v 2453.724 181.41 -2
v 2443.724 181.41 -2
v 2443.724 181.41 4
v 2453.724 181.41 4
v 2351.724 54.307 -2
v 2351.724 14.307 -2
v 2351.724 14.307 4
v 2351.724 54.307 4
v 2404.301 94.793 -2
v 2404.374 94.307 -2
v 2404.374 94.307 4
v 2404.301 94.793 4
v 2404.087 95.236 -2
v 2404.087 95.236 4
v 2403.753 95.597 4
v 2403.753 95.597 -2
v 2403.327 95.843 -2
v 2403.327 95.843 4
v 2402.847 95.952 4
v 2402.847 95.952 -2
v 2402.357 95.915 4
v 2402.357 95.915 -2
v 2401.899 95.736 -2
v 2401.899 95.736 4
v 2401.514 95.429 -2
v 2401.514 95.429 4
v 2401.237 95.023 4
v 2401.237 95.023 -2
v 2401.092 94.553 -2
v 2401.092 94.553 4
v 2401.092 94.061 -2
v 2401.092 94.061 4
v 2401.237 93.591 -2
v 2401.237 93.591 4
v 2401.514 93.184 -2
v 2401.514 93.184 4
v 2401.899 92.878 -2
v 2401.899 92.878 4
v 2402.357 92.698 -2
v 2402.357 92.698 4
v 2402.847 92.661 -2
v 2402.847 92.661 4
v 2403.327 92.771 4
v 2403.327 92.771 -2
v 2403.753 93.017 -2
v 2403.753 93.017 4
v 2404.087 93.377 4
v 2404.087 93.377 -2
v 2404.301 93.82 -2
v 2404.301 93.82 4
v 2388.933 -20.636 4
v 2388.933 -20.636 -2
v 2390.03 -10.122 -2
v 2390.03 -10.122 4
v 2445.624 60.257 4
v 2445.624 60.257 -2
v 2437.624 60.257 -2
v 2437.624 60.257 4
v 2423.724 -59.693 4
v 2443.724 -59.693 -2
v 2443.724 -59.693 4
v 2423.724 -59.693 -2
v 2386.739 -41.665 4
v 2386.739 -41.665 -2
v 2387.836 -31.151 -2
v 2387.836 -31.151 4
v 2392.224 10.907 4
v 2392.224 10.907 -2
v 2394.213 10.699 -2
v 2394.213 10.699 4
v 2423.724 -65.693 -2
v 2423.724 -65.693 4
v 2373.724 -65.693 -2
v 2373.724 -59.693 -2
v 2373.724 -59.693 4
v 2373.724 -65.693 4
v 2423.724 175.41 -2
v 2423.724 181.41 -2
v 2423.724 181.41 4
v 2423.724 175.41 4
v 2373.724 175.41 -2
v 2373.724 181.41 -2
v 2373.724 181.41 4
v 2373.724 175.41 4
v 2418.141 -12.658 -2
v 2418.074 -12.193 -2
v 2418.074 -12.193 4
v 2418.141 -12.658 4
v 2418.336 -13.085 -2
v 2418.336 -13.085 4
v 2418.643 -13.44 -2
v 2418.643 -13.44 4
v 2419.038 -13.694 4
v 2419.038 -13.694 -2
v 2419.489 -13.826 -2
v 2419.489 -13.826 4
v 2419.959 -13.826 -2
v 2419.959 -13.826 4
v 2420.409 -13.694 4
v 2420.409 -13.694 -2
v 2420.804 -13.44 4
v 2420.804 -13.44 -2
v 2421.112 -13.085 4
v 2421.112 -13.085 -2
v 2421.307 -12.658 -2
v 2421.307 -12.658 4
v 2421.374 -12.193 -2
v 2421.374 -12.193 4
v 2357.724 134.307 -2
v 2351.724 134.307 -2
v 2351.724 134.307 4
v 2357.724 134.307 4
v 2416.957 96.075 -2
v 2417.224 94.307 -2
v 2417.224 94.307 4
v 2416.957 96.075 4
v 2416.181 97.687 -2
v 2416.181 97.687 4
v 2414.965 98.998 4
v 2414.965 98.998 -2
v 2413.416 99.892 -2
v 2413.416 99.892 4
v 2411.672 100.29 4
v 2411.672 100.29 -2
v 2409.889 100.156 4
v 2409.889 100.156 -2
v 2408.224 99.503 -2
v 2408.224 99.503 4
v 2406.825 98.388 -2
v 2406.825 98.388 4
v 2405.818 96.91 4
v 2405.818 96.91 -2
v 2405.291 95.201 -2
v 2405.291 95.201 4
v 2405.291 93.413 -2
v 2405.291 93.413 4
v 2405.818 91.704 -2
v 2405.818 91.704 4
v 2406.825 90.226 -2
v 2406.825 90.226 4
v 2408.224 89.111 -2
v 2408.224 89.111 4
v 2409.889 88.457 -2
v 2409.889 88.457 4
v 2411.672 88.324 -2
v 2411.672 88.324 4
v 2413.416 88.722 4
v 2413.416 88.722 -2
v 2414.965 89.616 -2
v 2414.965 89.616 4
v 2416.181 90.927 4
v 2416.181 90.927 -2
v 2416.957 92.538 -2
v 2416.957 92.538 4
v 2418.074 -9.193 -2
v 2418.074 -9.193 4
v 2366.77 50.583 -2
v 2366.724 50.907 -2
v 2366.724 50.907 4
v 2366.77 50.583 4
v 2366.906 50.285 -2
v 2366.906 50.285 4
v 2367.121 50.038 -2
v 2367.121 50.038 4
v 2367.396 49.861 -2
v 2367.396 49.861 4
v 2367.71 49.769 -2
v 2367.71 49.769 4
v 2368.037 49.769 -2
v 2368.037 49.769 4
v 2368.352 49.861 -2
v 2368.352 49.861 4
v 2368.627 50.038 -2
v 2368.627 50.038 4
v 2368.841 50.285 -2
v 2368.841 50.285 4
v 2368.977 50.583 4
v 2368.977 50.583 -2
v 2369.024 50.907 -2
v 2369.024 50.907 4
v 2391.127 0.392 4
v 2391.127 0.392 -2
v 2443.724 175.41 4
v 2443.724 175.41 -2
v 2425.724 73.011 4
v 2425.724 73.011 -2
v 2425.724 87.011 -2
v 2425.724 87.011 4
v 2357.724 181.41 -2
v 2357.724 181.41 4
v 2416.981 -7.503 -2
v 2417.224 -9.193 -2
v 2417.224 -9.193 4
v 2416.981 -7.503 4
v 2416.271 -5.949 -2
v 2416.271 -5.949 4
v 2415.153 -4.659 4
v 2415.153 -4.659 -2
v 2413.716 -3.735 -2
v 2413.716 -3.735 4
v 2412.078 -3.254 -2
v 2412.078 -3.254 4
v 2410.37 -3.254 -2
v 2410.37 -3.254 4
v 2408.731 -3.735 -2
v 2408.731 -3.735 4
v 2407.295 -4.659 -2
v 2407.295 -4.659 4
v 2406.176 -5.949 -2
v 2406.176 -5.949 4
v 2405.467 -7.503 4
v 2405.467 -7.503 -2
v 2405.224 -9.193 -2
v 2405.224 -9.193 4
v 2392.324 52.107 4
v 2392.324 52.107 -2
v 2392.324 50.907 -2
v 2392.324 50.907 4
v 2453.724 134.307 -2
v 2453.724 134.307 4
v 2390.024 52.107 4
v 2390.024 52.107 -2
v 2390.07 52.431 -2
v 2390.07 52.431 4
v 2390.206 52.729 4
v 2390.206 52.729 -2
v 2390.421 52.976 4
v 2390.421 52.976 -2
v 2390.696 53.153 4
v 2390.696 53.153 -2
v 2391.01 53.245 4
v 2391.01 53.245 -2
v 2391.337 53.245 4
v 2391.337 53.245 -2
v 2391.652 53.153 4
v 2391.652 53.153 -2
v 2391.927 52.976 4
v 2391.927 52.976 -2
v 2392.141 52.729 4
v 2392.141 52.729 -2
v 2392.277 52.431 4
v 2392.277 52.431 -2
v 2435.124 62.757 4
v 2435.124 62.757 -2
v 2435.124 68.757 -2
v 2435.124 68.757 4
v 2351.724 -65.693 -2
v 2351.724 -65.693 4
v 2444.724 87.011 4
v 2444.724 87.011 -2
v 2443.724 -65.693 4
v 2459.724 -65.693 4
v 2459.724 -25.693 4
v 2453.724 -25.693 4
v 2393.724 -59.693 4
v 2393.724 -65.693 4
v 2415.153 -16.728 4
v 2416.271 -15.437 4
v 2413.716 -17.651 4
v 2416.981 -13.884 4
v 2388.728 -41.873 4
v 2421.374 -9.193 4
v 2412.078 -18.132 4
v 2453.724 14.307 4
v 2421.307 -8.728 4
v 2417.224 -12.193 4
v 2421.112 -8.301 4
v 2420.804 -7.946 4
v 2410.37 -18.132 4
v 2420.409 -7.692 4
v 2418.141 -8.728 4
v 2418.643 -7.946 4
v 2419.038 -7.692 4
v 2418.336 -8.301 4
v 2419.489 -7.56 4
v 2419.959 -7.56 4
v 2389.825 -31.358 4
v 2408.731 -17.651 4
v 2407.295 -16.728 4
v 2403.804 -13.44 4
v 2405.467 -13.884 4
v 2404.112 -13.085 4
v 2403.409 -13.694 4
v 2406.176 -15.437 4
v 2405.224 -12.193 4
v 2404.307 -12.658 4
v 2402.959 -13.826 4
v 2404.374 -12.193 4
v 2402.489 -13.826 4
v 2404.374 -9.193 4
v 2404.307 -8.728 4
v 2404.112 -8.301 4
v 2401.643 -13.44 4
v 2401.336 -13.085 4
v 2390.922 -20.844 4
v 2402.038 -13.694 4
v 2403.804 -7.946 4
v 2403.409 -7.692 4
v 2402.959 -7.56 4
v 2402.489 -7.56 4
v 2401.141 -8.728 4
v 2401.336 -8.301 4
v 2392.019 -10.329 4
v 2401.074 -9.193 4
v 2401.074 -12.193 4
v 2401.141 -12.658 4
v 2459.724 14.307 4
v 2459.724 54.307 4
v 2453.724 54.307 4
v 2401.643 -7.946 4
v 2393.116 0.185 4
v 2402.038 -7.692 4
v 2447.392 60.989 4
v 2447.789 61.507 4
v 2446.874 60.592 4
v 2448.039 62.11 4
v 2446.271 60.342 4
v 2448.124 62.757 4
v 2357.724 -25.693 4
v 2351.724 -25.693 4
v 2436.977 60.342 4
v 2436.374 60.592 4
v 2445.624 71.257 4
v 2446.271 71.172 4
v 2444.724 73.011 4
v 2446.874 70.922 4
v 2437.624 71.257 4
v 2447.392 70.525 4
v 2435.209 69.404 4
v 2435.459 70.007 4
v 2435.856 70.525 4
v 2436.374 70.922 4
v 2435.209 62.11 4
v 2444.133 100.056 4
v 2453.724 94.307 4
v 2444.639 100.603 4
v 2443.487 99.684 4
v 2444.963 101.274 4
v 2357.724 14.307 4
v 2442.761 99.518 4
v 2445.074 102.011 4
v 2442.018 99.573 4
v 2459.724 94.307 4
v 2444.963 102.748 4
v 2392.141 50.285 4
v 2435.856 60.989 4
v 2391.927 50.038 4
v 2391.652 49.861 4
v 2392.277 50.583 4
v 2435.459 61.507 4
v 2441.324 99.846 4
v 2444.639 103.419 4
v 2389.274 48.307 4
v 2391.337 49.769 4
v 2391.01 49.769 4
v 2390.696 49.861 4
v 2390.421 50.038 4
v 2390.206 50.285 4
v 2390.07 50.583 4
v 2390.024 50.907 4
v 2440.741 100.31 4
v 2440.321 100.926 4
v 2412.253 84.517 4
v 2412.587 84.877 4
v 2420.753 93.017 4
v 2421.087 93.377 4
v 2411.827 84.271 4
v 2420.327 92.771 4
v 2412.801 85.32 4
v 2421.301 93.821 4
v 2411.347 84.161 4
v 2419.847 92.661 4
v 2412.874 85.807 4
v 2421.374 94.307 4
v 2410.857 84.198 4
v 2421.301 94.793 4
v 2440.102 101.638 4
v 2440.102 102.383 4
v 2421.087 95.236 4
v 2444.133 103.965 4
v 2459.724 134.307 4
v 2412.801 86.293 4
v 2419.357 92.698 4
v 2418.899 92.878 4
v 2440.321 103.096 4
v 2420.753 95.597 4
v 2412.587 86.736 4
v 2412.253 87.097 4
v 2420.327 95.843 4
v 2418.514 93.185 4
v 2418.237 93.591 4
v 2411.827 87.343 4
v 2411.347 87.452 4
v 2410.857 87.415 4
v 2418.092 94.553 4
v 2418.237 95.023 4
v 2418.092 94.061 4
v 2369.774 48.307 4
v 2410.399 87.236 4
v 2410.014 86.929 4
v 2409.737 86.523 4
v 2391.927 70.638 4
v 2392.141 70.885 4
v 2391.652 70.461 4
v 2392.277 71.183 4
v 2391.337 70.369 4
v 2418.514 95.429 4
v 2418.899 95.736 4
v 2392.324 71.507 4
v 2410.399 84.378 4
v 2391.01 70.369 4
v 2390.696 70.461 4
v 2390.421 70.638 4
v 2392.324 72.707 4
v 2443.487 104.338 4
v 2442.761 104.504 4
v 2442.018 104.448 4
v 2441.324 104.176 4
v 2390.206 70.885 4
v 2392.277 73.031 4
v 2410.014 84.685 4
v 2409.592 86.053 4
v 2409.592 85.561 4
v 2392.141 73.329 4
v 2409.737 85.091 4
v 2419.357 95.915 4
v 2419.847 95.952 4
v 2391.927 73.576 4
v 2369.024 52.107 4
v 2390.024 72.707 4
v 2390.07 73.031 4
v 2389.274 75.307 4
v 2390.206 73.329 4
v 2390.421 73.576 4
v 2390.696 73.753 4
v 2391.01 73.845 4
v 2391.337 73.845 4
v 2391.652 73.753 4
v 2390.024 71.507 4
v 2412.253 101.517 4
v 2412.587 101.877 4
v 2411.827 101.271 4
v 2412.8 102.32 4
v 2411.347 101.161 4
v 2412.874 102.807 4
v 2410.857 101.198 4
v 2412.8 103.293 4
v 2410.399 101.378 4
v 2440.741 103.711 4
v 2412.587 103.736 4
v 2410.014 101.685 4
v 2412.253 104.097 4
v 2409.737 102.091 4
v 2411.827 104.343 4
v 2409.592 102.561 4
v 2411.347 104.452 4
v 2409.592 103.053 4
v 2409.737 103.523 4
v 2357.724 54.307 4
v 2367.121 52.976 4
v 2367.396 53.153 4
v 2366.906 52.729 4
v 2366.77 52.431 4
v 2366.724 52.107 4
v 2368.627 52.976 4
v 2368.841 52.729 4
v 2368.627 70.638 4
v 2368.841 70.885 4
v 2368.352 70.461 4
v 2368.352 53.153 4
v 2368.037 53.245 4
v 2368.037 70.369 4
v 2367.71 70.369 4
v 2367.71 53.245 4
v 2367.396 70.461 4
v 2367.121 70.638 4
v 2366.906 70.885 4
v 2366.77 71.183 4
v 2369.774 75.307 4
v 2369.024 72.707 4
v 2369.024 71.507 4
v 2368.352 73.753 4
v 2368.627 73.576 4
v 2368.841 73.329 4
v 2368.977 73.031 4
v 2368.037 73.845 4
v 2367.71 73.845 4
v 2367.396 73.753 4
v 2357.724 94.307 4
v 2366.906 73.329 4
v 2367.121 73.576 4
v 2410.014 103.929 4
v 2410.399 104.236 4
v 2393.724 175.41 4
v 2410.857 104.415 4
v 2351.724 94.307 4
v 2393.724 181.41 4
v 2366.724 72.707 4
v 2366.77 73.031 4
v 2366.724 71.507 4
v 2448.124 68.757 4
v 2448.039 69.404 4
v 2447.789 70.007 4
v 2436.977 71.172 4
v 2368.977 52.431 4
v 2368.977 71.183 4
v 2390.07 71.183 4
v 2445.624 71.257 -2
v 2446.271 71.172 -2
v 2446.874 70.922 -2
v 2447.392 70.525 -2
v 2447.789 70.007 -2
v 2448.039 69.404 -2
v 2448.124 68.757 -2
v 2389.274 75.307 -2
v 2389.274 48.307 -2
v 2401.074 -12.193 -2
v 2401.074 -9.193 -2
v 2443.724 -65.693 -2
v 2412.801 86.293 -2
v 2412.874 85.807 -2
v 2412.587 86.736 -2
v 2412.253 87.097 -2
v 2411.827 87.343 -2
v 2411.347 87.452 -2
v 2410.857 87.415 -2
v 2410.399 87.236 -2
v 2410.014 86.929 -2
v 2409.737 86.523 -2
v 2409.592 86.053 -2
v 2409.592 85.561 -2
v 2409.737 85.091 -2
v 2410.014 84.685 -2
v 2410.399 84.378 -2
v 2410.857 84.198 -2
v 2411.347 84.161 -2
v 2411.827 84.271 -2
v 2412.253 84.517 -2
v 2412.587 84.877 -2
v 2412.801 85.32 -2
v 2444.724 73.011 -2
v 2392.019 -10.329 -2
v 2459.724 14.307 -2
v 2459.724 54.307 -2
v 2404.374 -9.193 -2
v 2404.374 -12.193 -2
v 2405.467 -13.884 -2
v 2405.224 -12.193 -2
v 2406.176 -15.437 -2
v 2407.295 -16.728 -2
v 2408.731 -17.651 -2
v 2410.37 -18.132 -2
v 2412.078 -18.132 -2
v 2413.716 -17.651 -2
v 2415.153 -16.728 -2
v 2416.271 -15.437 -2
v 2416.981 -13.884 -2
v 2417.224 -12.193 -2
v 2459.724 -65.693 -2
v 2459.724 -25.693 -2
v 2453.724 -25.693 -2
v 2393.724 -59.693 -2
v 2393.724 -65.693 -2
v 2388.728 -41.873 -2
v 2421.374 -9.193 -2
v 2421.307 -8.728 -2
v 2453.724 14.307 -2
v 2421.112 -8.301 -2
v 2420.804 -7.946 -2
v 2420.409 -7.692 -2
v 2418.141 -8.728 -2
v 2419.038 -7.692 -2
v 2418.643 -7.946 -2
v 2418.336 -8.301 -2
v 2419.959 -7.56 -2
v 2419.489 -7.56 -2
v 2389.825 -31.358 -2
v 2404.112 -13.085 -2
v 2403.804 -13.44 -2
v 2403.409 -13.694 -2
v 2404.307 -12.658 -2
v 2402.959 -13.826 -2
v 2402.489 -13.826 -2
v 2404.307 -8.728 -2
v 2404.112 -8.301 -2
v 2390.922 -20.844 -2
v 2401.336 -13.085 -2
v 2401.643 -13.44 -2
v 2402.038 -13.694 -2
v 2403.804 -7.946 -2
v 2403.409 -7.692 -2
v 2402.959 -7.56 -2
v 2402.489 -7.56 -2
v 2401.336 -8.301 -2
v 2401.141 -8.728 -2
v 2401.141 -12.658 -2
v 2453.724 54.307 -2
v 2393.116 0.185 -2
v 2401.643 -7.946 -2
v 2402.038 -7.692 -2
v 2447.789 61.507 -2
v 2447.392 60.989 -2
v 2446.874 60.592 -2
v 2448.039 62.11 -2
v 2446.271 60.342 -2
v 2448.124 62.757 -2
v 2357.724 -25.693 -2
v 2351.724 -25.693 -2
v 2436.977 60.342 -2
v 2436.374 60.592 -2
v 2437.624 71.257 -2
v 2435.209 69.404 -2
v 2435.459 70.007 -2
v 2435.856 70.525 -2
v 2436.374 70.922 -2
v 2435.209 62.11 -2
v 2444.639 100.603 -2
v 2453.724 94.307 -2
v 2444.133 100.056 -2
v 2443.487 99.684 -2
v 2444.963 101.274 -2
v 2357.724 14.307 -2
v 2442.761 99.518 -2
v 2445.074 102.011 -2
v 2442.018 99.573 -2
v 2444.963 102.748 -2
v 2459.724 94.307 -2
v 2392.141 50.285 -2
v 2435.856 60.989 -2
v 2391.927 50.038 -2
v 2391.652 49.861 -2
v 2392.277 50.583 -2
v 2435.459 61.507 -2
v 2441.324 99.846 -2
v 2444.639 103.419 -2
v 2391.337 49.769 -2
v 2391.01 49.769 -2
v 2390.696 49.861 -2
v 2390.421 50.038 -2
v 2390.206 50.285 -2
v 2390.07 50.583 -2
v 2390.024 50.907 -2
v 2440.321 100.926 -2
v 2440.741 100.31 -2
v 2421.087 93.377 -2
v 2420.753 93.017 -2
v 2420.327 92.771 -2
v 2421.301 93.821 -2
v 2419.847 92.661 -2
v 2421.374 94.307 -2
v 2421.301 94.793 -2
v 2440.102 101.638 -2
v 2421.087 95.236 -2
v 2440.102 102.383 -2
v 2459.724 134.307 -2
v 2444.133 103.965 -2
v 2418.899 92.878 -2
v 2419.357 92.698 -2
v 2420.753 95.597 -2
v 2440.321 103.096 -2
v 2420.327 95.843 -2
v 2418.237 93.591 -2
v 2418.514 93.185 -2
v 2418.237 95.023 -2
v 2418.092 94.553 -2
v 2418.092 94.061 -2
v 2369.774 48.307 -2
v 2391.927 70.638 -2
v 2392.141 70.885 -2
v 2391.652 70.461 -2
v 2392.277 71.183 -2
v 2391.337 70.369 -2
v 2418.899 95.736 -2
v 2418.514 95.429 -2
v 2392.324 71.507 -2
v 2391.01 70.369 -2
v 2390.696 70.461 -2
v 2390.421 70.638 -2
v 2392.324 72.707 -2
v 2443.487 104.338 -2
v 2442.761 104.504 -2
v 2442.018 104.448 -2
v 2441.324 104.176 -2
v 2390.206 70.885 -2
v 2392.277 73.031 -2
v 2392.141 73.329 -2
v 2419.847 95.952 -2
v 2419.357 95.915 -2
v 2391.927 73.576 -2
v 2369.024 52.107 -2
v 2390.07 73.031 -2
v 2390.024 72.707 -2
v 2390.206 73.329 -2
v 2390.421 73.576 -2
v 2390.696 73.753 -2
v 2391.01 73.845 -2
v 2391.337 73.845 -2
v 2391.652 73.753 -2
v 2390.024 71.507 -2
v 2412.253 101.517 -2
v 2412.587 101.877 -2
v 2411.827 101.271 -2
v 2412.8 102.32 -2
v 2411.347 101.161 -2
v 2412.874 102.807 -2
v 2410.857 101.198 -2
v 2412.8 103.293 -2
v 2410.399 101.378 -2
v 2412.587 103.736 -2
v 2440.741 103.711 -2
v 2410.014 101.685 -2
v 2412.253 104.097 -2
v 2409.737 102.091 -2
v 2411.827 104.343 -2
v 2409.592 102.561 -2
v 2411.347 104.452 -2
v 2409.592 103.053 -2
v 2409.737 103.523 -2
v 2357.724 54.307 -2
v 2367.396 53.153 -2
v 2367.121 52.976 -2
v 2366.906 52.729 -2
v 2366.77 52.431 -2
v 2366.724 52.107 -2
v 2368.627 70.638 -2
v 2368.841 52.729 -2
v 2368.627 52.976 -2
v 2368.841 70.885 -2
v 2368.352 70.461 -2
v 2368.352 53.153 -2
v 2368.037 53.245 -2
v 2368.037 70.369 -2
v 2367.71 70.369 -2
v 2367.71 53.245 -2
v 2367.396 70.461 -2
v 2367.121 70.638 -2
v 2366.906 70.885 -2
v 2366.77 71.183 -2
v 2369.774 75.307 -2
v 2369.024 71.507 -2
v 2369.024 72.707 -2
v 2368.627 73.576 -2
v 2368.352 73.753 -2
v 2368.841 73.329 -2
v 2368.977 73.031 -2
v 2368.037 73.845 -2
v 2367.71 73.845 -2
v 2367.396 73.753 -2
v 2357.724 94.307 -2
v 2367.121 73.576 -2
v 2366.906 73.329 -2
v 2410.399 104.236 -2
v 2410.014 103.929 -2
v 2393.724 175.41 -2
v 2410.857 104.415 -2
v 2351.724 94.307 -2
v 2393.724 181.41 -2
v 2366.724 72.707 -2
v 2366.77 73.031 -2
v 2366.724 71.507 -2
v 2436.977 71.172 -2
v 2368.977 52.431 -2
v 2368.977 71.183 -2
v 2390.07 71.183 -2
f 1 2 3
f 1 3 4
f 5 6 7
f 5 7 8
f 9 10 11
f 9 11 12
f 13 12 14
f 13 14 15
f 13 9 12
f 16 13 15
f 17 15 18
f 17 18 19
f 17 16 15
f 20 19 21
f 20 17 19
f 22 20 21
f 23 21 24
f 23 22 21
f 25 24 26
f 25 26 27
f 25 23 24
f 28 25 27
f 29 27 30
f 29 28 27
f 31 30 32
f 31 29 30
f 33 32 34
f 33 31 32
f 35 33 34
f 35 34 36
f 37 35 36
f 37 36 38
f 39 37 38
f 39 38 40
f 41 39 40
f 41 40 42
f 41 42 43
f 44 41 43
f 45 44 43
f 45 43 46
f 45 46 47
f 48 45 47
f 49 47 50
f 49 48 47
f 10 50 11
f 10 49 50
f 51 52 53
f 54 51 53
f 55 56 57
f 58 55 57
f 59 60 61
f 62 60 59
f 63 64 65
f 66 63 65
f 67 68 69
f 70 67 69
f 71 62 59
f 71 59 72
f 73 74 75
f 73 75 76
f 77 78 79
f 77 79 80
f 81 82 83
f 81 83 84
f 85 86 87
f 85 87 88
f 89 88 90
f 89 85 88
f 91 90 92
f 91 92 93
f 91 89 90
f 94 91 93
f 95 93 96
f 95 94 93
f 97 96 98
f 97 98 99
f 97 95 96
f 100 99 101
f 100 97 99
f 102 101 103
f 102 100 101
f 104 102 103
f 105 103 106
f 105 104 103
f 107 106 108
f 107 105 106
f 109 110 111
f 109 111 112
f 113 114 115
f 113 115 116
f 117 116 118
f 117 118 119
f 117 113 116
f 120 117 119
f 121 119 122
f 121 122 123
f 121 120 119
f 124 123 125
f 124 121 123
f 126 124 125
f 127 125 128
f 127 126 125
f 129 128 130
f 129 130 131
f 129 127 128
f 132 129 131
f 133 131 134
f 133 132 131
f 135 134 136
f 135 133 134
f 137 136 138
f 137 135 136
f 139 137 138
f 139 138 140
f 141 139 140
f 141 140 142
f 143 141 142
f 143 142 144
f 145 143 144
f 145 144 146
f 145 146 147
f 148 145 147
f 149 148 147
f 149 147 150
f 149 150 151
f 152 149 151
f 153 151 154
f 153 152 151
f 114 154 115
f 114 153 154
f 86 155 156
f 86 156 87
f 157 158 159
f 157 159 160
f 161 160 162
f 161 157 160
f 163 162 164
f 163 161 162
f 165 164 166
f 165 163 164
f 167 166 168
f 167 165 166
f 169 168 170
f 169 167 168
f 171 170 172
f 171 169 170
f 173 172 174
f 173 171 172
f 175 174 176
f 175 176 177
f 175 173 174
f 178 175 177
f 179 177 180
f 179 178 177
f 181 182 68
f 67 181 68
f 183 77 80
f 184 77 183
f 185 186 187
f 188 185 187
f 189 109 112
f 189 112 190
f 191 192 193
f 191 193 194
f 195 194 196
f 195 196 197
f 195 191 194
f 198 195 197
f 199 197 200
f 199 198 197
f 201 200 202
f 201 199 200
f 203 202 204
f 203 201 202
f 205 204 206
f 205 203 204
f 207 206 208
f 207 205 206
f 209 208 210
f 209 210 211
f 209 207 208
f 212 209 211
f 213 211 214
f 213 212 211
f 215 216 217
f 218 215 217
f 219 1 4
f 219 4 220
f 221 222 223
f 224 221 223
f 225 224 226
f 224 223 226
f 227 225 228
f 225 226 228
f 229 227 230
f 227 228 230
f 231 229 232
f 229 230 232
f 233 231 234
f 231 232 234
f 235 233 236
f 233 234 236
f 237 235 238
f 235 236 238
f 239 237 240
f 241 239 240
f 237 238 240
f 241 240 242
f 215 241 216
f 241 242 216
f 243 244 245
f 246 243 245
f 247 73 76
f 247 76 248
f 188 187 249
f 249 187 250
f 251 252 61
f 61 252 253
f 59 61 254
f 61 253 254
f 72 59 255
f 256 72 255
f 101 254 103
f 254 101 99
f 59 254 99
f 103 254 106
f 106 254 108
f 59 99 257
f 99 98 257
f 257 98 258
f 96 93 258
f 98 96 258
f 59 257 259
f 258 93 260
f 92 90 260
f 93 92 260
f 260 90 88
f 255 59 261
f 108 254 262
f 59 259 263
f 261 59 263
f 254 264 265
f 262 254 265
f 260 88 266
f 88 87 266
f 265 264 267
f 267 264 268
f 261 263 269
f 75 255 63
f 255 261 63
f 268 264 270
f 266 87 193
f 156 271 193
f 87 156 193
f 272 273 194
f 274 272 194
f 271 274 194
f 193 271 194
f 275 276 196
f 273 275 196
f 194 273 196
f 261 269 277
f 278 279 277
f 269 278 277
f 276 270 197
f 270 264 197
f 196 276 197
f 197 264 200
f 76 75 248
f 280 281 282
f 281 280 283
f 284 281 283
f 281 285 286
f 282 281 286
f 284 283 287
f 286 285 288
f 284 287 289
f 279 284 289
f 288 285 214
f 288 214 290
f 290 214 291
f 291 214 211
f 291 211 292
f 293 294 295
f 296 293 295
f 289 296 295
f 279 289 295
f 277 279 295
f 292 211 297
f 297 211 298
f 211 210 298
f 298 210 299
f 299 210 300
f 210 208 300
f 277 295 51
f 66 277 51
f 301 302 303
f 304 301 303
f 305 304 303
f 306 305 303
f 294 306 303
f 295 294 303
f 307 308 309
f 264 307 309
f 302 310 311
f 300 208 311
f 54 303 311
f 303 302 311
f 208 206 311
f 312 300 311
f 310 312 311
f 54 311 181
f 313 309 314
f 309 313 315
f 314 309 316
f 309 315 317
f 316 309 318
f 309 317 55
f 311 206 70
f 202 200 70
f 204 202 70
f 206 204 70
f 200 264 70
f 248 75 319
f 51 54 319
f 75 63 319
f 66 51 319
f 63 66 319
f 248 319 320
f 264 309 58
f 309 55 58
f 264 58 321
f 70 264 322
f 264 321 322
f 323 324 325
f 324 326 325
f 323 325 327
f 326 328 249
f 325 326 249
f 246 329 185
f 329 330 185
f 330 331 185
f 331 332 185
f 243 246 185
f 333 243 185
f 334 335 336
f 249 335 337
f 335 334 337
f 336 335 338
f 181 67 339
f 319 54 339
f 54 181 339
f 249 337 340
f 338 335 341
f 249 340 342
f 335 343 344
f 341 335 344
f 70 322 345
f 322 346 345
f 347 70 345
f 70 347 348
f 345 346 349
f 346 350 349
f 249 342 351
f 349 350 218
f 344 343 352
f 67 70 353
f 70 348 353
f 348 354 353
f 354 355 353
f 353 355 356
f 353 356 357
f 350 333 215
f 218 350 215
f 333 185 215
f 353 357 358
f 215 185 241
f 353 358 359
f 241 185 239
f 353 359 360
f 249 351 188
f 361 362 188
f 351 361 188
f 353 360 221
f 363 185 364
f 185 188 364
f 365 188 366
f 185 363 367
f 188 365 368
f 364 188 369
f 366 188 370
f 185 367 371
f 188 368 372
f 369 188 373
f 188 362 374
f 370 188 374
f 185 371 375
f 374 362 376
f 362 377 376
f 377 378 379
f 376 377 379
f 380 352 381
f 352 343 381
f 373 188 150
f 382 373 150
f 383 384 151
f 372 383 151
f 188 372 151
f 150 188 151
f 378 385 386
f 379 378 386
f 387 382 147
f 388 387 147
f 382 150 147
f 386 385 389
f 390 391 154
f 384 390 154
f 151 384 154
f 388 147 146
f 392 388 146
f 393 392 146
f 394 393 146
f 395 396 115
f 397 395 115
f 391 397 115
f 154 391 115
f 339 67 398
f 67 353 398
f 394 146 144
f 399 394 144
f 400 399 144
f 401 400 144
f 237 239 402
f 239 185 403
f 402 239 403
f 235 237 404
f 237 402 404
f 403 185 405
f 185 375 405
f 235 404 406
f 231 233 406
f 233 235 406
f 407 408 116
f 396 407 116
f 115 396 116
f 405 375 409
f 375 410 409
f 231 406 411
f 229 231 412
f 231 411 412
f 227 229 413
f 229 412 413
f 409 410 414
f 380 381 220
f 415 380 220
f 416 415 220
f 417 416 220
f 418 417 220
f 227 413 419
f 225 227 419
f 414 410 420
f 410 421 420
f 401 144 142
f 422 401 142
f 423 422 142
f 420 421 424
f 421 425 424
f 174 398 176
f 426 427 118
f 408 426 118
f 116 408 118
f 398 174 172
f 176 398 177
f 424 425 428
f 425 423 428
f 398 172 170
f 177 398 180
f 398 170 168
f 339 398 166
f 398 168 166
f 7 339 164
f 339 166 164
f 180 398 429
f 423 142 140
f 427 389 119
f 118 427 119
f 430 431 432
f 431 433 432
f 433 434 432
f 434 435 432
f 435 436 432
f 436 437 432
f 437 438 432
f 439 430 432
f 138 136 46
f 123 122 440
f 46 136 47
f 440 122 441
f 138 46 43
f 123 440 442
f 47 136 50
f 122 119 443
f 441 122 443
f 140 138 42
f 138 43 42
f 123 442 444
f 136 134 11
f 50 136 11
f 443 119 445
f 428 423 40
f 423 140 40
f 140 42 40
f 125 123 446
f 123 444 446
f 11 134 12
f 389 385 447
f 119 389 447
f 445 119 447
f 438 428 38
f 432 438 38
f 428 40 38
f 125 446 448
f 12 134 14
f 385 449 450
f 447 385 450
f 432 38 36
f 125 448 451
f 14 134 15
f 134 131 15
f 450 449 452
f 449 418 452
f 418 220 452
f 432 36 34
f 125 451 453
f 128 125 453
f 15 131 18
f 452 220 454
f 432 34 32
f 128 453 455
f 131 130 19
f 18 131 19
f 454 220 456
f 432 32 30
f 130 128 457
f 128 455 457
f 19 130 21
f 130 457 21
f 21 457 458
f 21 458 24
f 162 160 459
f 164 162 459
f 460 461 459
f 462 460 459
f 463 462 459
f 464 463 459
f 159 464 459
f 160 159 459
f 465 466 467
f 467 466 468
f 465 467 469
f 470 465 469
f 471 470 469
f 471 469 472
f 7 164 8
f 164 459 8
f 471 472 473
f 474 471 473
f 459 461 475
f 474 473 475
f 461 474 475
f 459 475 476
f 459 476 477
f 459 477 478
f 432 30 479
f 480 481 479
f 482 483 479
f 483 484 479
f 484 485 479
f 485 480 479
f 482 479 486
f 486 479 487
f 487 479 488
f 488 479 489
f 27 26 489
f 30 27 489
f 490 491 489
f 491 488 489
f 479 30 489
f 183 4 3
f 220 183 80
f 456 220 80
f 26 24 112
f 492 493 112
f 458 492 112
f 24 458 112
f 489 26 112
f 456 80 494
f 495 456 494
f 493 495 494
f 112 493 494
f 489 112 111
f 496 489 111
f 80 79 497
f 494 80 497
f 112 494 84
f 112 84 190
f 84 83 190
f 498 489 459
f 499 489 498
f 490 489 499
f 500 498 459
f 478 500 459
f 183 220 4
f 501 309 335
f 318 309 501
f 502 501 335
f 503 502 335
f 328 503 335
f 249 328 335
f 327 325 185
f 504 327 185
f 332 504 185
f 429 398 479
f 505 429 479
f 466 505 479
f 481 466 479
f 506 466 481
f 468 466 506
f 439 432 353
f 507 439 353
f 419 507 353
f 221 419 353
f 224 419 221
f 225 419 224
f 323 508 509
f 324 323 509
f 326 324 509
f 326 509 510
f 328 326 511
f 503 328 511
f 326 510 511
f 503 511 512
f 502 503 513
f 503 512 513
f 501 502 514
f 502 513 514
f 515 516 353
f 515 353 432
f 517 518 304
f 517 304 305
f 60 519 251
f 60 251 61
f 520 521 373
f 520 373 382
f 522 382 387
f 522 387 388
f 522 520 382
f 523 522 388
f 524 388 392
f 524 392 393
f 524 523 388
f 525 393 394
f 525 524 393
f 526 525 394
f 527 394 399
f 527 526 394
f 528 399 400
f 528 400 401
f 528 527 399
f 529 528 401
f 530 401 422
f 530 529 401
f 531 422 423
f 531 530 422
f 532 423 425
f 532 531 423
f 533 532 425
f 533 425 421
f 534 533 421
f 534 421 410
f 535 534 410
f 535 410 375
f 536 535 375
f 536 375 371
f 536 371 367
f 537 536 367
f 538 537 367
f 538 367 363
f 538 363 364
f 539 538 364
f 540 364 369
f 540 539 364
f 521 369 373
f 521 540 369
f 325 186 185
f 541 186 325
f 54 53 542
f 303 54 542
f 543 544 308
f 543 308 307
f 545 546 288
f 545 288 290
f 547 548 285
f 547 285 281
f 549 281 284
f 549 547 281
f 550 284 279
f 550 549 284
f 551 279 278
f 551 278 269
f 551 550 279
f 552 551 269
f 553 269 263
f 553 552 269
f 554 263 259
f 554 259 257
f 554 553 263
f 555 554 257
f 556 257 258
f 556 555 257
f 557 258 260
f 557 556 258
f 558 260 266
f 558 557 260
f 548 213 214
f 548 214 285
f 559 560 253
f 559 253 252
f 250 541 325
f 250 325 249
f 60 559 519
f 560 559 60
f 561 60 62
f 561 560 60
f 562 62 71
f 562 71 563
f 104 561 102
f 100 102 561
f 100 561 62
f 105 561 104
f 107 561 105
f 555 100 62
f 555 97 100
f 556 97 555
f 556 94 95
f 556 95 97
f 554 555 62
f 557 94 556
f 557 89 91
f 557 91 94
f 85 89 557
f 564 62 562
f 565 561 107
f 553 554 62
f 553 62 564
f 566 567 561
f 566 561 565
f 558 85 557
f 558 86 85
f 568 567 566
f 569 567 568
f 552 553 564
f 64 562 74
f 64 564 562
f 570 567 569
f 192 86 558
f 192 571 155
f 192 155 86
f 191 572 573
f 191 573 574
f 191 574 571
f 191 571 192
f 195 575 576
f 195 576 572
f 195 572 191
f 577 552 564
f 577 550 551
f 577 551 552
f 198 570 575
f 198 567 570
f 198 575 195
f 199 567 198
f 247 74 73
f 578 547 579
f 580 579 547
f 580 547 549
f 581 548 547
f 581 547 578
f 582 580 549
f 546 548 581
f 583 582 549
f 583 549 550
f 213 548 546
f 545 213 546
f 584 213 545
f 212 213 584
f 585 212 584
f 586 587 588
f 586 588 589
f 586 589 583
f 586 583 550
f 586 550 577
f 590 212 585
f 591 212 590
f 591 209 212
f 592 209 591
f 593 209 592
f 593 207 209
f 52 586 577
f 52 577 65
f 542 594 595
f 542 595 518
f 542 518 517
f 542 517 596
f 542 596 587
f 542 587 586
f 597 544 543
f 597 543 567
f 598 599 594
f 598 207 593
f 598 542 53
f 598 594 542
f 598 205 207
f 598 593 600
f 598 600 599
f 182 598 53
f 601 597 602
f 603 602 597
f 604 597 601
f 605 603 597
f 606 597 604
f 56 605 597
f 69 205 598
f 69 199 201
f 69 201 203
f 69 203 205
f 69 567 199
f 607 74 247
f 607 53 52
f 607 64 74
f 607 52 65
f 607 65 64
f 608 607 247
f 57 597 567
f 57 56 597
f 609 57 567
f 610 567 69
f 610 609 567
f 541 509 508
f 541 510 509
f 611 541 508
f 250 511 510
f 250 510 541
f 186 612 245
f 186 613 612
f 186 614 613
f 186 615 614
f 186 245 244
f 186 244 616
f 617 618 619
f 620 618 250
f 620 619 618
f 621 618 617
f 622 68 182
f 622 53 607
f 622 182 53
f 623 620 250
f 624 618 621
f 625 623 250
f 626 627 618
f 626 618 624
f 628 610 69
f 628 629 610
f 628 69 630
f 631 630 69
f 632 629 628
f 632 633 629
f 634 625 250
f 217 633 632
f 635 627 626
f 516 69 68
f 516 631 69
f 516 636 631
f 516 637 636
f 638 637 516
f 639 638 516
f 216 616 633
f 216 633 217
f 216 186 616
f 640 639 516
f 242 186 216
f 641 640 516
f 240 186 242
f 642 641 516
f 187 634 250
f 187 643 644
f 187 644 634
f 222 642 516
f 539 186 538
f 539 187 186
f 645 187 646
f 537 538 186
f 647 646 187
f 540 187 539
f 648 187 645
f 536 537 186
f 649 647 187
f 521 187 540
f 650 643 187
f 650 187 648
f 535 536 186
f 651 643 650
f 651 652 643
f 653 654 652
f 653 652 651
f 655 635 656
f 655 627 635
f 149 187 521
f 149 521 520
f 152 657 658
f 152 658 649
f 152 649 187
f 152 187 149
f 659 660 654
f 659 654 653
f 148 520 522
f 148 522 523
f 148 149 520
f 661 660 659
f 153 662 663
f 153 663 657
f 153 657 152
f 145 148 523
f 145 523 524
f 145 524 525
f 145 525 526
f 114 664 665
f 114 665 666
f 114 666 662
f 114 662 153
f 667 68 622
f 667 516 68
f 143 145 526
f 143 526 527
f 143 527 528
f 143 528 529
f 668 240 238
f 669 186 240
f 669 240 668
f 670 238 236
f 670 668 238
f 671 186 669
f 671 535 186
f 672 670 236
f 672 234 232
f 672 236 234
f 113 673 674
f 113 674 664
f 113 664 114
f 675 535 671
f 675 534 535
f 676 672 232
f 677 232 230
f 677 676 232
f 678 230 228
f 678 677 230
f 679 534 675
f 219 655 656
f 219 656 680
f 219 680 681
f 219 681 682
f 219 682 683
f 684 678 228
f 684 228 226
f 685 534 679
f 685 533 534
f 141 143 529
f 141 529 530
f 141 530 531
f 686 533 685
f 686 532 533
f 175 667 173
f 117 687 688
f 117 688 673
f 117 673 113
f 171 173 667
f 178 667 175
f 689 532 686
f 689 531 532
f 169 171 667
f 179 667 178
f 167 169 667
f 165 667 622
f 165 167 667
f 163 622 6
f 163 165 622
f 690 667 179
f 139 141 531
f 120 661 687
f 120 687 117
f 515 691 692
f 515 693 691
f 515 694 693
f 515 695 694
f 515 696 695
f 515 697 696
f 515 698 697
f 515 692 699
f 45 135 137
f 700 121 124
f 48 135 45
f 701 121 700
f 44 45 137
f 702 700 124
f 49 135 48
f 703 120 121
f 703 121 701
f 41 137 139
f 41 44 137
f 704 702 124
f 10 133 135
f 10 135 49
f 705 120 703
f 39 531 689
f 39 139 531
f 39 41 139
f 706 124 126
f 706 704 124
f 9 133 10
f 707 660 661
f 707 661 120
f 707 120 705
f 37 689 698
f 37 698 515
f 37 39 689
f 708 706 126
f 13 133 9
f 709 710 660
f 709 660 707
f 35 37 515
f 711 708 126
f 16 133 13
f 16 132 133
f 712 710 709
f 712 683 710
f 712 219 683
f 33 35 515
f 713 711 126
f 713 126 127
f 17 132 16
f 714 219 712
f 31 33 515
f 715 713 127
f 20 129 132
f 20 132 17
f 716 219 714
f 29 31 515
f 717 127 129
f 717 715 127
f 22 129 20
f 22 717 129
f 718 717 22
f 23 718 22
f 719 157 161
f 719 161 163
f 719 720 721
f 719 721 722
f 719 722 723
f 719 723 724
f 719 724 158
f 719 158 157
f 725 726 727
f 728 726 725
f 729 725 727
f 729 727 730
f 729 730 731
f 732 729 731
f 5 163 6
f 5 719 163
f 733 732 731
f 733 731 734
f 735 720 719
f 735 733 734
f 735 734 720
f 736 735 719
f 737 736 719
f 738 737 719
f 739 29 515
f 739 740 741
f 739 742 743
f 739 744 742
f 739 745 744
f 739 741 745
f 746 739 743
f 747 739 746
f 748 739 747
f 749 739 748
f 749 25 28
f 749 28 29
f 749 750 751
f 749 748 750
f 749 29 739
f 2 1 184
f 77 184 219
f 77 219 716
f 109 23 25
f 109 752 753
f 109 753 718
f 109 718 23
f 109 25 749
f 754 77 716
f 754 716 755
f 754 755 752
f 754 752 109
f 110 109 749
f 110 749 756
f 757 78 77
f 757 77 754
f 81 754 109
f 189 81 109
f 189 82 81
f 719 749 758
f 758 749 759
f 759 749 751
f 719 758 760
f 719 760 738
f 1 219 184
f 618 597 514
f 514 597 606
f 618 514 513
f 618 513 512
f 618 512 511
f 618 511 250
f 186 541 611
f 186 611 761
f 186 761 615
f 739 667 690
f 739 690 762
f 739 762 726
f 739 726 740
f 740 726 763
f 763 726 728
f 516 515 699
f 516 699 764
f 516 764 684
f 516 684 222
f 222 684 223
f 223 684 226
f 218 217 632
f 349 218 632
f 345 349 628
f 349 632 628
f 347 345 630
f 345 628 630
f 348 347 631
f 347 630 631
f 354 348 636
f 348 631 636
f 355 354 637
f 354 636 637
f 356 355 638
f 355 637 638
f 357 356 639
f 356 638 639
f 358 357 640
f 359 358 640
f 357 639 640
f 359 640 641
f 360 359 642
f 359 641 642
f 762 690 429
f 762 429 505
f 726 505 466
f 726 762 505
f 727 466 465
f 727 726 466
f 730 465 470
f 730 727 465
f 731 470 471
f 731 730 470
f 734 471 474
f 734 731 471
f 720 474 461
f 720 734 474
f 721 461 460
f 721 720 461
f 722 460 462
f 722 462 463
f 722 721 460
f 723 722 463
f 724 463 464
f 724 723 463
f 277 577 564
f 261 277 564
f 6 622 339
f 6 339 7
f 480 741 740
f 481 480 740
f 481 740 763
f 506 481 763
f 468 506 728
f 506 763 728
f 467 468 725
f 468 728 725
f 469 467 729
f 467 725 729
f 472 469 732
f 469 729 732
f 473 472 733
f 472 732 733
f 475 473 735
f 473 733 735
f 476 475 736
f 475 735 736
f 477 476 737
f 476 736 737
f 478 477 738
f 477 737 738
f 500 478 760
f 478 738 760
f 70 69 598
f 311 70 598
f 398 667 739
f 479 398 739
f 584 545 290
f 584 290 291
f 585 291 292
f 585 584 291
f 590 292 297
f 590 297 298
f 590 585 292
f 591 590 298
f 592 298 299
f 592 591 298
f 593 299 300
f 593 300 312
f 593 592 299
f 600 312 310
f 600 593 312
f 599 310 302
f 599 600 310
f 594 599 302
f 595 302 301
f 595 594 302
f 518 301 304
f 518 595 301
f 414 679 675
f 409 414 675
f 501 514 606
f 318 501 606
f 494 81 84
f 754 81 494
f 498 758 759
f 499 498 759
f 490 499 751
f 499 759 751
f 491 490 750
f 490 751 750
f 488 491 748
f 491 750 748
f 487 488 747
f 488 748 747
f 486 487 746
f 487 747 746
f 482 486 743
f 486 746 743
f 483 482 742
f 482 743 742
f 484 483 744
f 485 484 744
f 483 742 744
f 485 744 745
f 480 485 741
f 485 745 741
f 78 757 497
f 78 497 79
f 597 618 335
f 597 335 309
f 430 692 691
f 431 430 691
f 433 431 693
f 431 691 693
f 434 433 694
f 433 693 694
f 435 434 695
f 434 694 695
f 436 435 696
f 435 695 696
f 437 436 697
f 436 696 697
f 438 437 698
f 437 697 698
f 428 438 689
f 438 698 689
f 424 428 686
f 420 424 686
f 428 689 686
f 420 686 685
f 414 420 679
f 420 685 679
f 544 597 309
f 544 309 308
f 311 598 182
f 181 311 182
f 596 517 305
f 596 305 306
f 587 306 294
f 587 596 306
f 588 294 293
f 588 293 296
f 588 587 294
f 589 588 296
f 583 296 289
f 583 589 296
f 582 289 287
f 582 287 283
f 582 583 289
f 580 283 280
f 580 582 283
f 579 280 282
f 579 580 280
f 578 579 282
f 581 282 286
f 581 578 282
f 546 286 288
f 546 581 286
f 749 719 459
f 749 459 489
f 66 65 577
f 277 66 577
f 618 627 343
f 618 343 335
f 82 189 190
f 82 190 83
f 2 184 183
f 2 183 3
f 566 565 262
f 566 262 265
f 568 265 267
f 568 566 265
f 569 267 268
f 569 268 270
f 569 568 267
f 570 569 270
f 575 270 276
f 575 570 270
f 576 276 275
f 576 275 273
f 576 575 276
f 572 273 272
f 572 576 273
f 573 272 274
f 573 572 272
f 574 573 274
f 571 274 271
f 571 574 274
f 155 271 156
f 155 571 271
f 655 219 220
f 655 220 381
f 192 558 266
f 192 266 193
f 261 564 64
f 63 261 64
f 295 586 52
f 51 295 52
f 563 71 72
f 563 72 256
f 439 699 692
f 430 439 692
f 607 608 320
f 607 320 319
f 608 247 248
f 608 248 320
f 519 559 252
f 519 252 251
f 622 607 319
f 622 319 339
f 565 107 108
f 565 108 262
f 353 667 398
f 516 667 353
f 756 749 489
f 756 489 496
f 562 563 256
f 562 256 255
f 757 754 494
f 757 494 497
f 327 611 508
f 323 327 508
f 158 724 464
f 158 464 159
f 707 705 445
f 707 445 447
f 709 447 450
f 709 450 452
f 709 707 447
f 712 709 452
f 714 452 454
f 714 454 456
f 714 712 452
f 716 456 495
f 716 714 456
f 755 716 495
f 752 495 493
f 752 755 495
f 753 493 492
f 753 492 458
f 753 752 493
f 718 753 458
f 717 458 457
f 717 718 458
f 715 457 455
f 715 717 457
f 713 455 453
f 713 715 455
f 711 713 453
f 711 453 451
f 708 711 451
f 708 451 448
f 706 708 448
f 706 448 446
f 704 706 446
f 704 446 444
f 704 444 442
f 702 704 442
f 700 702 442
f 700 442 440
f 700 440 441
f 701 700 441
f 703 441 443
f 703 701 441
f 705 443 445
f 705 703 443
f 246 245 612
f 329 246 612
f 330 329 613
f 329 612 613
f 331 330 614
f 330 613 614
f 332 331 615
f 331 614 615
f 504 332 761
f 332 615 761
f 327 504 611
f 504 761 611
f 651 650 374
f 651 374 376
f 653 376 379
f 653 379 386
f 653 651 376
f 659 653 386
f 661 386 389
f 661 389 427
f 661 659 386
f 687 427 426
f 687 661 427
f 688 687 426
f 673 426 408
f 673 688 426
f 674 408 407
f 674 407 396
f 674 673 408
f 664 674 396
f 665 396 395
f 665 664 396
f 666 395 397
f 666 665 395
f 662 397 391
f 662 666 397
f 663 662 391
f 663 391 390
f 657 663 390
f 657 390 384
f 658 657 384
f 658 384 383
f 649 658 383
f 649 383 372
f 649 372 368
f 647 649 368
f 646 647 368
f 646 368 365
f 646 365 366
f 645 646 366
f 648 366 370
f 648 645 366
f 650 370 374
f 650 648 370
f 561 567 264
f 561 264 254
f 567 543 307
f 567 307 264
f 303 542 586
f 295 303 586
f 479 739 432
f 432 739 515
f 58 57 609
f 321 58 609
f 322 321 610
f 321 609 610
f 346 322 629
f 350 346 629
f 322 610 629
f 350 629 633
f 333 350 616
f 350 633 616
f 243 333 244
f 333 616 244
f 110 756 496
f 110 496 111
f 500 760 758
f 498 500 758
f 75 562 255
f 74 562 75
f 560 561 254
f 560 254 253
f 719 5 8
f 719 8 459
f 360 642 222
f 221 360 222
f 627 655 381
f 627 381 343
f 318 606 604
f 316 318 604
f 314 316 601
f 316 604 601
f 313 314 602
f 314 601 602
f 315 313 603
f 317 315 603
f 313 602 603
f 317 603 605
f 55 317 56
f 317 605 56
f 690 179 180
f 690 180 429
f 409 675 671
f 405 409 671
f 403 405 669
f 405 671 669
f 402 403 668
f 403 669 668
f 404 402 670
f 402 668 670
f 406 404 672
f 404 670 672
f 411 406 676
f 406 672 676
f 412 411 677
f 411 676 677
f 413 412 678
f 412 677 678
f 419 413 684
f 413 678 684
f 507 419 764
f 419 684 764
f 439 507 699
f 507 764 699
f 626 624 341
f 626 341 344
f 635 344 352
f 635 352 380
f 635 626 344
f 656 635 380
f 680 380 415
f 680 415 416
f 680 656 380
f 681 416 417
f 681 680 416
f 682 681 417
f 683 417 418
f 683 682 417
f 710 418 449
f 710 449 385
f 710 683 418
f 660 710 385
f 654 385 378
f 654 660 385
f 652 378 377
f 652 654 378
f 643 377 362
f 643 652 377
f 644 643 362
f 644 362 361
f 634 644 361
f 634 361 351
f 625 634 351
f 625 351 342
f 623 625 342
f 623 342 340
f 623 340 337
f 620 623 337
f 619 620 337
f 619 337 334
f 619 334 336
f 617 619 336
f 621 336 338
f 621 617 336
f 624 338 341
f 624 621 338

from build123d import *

# Parameters (mm, degrees)
ESQUISSE1_R        = 1.65
ESQUISSE1_R_2      = 6
ESQUISSE1_R_3      = 2.5
ESQUISSE1_W        = 19.5
ESQUISSE1_H        = 27
ESQUISSE1_W_2      = 19
ESQUISSE1_H_2      = 14
BOSS_EXTRU_1_DEPTH = 6


with BuildPart() as part:
    # Esquisse1 → Boss.-Extru.1 (new body)
    with BuildSketch(Plane.XY.offset(-2)):
        Polygon((2459.723805414, -65.693190997), (2443.723805414, -65.693190997), (2443.723805414, -59.693190997), (2423.723805414, -59.693190997), (2423.723805414, -65.693190997), (2393.723805414, -65.693190997), (2393.723805414, -59.693190997), (2373.723805414, -59.693190997), (2373.723805414, -65.693190997), (2351.723805414, -65.693190997), (2351.723805414, -25.693190997), (2357.723805414, -25.693190997), (2357.723805414, 14.306809003), (2351.723805414, 14.306809003), (2351.723805414, 54.306809003), (2357.723805414, 54.306809003), (2357.723805414, 94.306809003), (2351.723805414, 94.306809003), (2351.723805414, 134.306809003), (2357.723805414, 134.306809003), (2357.723805414, 181.409908735), (2373.723805414, 181.409908735), (2373.723805414, 175.409908735), (2393.723805414, 175.409908735), (2393.723805414, 181.409908735), (2423.723805414, 181.409908735), (2423.723805414, 175.409908735), (2443.723805414, 175.409908735), (2443.723805414, 181.409908735), (2453.723805414, 181.409908735), (2453.723805414, 134.306809003), (2459.723805414, 134.306809003), (2459.723805414, 94.306809003), (2453.723805414, 94.306809003), (2453.723805414, 54.306809003), (2459.723805414, 54.306809003), (2459.723805414, 14.306809003), (2453.723805414, 14.306809003), (2453.723805414, -25.693190997), (2459.723805414, -25.693190997), align=None)
        with Locations((2411.223763127, 102.806809003)):
            Circle(ESQUISSE1_R, mode=Mode.SUBTRACT)
        with Locations((2419.723805414, 94.306851291)):
            Circle(ESQUISSE1_R, mode=Mode.SUBTRACT)
        with Locations((2411.223805414, 94.306809003)):
            Circle(ESQUISSE1_R_2, mode=Mode.SUBTRACT)
        with Locations((2402.723805414, 94.306766716)):
            Circle(ESQUISSE1_R, mode=Mode.SUBTRACT)
        with Locations((2411.223847701, 85.806809003)):
            Circle(ESQUISSE1_R, mode=Mode.SUBTRACT)
        with Locations((2442.573805414, 102.010809003)):
            Circle(ESQUISSE1_R_3, mode=Mode.SUBTRACT)
        with Locations((2379.523805414, 61.806809003)):
            Rectangle(ESQUISSE1_W, ESQUISSE1_H, mode=Mode.SUBTRACT)
        with BuildLine():
            Line((2366.723805414, 71.506809003), (2366.723805414, 72.706809003))
            ThreePointArc((2366.723805414, 72.706809003), (2367.873805414, 73.856809003), (2369.023805414, 72.706809003))
            Line((2369.023805414, 72.706809003), (2369.023805414, 71.506809003))
            ThreePointArc((2369.023805414, 71.506809003), (2367.873805414, 70.356809003), (2366.723805414, 71.506809003))
        make_face(mode=Mode.SUBTRACT)
        with BuildLine():
            Line((2392.323805414, 72.706809003), (2392.323805414, 71.506809003))
            ThreePointArc((2392.323805414, 71.506809003), (2391.173805414, 70.356809003), (2390.023805414, 71.506809003))
            Line((2390.023805414, 71.506809003), (2390.023805414, 72.706809003))
            ThreePointArc((2390.023805414, 72.706809003), (2391.173805414, 73.856809003), (2392.323805414, 72.706809003))
        make_face(mode=Mode.SUBTRACT)
        with BuildLine():
            Line((2392.323805414, 52.106809003), (2392.323805414, 50.906809003))
            ThreePointArc((2392.323805414, 50.906809003), (2391.173805414, 49.756809003), (2390.023805414, 50.906809003))
            Line((2390.023805414, 50.906809003), (2390.023805414, 52.106809003))
            ThreePointArc((2390.023805414, 52.106809003), (2391.173805414, 53.256809003), (2392.323805414, 52.106809003))
        make_face(mode=Mode.SUBTRACT)
        with BuildLine():
            Line((2366.723805414, 52.106809003), (2366.723805414, 50.906809003))
            ThreePointArc((2366.723805414, 50.906809003), (2367.873805414, 49.756809003), (2369.023805414, 50.906809003))
            Line((2369.023805414, 50.906809003), (2369.023805414, 52.106809003))
            ThreePointArc((2369.023805414, 52.106809003), (2367.873805414, 53.256809003), (2366.723805414, 52.106809003))
        make_face(mode=Mode.SUBTRACT)
        with BuildLine():
            Line((2418.073805414, -9.193190997), (2418.073805414, -12.193190997))
            ThreePointArc((2418.073805414, -12.193190997), (2419.723805414, -13.843190997), (2421.373805414, -12.193190997))
            Line((2421.373805414, -12.193190997), (2421.373805414, -9.193190997))
            ThreePointArc((2421.373805414, -9.193190997), (2419.723805414, -7.543190997), (2418.073805414, -9.193190997))
        make_face(mode=Mode.SUBTRACT)
        with BuildLine():
            Line((2401.073805414, -9.193190997), (2401.073805414, -12.193190997))
            ThreePointArc((2401.073805414, -12.193190997), (2402.723805414, -13.843190997), (2404.373805414, -12.193190997))
            Line((2404.373805414, -12.193190997), (2404.373805414, -9.193190997))
            ThreePointArc((2404.373805414, -9.193190997), (2402.723805414, -7.543190997), (2401.073805414, -9.193190997))
        make_face(mode=Mode.SUBTRACT)
        with BuildLine():
            Line((2405.223805414, -9.193190997), (2405.223805414, -12.193190997))
            ThreePointArc((2405.223805414, -12.193190997), (2411.223805414, -18.193190997), (2417.223805414, -12.193190997))
            Line((2417.223805414, -12.193190997), (2417.223805414, -9.193190997))
            ThreePointArc((2417.223805414, -9.193190997), (2411.223805414, -3.193190997), (2405.223805414, -9.193190997))
        make_face(mode=Mode.SUBTRACT)
        with Locations((2435.223805414, 80.010809003)):
            Rectangle(ESQUISSE1_W_2, ESQUISSE1_H_2, mode=Mode.SUBTRACT)
        with BuildLine():
            Line((2448.123805414, 68.756809003), (2448.123805414, 62.756809003))
            ThreePointArc((2448.123805414, 62.756809003), (2447.391572367, 60.98904205), (2445.623805414, 60.256809003))
            Line((2445.623805414, 60.256809003), (2437.623805414, 60.256809003))
            ThreePointArc((2437.623805414, 60.256809003), (2435.856038461, 60.98904205), (2435.123805414, 62.756809003))
            Line((2435.123805414, 62.756809003), (2435.123805414, 68.756809003))
            ThreePointArc((2435.123805414, 68.756809003), (2435.856038461, 70.524575956), (2437.623805414, 71.256809003))
            Line((2437.623805414, 71.256809003), (2445.623805414, 71.256809003))
            ThreePointArc((2445.623805414, 71.256809003), (2447.391572367, 70.524575956), (2448.123805414, 68.756809003))
        make_face(mode=Mode.SUBTRACT)
        Polygon((2386.739083665, -41.66500263), (2387.836028015, -31.150640303), (2389.825231698, -31.358170315), (2388.728287348, -41.872532642), align=None, mode=Mode.SUBTRACT)
        Polygon((2388.932972364, -20.636277977), (2390.029916714, -10.12191565), (2392.019120398, -10.329445662), (2390.922176048, -20.843807989), align=None, mode=Mode.SUBTRACT)
        Polygon((2391.126861064, 0.392446677), (2392.223805414, 10.906809003), (2394.213009097, 10.699278991), (2393.116064748, 0.184916664), align=None, mode=Mode.SUBTRACT)
    extrude(amount=BOSS_EXTRU_1_DEPTH)


solid = part.part
